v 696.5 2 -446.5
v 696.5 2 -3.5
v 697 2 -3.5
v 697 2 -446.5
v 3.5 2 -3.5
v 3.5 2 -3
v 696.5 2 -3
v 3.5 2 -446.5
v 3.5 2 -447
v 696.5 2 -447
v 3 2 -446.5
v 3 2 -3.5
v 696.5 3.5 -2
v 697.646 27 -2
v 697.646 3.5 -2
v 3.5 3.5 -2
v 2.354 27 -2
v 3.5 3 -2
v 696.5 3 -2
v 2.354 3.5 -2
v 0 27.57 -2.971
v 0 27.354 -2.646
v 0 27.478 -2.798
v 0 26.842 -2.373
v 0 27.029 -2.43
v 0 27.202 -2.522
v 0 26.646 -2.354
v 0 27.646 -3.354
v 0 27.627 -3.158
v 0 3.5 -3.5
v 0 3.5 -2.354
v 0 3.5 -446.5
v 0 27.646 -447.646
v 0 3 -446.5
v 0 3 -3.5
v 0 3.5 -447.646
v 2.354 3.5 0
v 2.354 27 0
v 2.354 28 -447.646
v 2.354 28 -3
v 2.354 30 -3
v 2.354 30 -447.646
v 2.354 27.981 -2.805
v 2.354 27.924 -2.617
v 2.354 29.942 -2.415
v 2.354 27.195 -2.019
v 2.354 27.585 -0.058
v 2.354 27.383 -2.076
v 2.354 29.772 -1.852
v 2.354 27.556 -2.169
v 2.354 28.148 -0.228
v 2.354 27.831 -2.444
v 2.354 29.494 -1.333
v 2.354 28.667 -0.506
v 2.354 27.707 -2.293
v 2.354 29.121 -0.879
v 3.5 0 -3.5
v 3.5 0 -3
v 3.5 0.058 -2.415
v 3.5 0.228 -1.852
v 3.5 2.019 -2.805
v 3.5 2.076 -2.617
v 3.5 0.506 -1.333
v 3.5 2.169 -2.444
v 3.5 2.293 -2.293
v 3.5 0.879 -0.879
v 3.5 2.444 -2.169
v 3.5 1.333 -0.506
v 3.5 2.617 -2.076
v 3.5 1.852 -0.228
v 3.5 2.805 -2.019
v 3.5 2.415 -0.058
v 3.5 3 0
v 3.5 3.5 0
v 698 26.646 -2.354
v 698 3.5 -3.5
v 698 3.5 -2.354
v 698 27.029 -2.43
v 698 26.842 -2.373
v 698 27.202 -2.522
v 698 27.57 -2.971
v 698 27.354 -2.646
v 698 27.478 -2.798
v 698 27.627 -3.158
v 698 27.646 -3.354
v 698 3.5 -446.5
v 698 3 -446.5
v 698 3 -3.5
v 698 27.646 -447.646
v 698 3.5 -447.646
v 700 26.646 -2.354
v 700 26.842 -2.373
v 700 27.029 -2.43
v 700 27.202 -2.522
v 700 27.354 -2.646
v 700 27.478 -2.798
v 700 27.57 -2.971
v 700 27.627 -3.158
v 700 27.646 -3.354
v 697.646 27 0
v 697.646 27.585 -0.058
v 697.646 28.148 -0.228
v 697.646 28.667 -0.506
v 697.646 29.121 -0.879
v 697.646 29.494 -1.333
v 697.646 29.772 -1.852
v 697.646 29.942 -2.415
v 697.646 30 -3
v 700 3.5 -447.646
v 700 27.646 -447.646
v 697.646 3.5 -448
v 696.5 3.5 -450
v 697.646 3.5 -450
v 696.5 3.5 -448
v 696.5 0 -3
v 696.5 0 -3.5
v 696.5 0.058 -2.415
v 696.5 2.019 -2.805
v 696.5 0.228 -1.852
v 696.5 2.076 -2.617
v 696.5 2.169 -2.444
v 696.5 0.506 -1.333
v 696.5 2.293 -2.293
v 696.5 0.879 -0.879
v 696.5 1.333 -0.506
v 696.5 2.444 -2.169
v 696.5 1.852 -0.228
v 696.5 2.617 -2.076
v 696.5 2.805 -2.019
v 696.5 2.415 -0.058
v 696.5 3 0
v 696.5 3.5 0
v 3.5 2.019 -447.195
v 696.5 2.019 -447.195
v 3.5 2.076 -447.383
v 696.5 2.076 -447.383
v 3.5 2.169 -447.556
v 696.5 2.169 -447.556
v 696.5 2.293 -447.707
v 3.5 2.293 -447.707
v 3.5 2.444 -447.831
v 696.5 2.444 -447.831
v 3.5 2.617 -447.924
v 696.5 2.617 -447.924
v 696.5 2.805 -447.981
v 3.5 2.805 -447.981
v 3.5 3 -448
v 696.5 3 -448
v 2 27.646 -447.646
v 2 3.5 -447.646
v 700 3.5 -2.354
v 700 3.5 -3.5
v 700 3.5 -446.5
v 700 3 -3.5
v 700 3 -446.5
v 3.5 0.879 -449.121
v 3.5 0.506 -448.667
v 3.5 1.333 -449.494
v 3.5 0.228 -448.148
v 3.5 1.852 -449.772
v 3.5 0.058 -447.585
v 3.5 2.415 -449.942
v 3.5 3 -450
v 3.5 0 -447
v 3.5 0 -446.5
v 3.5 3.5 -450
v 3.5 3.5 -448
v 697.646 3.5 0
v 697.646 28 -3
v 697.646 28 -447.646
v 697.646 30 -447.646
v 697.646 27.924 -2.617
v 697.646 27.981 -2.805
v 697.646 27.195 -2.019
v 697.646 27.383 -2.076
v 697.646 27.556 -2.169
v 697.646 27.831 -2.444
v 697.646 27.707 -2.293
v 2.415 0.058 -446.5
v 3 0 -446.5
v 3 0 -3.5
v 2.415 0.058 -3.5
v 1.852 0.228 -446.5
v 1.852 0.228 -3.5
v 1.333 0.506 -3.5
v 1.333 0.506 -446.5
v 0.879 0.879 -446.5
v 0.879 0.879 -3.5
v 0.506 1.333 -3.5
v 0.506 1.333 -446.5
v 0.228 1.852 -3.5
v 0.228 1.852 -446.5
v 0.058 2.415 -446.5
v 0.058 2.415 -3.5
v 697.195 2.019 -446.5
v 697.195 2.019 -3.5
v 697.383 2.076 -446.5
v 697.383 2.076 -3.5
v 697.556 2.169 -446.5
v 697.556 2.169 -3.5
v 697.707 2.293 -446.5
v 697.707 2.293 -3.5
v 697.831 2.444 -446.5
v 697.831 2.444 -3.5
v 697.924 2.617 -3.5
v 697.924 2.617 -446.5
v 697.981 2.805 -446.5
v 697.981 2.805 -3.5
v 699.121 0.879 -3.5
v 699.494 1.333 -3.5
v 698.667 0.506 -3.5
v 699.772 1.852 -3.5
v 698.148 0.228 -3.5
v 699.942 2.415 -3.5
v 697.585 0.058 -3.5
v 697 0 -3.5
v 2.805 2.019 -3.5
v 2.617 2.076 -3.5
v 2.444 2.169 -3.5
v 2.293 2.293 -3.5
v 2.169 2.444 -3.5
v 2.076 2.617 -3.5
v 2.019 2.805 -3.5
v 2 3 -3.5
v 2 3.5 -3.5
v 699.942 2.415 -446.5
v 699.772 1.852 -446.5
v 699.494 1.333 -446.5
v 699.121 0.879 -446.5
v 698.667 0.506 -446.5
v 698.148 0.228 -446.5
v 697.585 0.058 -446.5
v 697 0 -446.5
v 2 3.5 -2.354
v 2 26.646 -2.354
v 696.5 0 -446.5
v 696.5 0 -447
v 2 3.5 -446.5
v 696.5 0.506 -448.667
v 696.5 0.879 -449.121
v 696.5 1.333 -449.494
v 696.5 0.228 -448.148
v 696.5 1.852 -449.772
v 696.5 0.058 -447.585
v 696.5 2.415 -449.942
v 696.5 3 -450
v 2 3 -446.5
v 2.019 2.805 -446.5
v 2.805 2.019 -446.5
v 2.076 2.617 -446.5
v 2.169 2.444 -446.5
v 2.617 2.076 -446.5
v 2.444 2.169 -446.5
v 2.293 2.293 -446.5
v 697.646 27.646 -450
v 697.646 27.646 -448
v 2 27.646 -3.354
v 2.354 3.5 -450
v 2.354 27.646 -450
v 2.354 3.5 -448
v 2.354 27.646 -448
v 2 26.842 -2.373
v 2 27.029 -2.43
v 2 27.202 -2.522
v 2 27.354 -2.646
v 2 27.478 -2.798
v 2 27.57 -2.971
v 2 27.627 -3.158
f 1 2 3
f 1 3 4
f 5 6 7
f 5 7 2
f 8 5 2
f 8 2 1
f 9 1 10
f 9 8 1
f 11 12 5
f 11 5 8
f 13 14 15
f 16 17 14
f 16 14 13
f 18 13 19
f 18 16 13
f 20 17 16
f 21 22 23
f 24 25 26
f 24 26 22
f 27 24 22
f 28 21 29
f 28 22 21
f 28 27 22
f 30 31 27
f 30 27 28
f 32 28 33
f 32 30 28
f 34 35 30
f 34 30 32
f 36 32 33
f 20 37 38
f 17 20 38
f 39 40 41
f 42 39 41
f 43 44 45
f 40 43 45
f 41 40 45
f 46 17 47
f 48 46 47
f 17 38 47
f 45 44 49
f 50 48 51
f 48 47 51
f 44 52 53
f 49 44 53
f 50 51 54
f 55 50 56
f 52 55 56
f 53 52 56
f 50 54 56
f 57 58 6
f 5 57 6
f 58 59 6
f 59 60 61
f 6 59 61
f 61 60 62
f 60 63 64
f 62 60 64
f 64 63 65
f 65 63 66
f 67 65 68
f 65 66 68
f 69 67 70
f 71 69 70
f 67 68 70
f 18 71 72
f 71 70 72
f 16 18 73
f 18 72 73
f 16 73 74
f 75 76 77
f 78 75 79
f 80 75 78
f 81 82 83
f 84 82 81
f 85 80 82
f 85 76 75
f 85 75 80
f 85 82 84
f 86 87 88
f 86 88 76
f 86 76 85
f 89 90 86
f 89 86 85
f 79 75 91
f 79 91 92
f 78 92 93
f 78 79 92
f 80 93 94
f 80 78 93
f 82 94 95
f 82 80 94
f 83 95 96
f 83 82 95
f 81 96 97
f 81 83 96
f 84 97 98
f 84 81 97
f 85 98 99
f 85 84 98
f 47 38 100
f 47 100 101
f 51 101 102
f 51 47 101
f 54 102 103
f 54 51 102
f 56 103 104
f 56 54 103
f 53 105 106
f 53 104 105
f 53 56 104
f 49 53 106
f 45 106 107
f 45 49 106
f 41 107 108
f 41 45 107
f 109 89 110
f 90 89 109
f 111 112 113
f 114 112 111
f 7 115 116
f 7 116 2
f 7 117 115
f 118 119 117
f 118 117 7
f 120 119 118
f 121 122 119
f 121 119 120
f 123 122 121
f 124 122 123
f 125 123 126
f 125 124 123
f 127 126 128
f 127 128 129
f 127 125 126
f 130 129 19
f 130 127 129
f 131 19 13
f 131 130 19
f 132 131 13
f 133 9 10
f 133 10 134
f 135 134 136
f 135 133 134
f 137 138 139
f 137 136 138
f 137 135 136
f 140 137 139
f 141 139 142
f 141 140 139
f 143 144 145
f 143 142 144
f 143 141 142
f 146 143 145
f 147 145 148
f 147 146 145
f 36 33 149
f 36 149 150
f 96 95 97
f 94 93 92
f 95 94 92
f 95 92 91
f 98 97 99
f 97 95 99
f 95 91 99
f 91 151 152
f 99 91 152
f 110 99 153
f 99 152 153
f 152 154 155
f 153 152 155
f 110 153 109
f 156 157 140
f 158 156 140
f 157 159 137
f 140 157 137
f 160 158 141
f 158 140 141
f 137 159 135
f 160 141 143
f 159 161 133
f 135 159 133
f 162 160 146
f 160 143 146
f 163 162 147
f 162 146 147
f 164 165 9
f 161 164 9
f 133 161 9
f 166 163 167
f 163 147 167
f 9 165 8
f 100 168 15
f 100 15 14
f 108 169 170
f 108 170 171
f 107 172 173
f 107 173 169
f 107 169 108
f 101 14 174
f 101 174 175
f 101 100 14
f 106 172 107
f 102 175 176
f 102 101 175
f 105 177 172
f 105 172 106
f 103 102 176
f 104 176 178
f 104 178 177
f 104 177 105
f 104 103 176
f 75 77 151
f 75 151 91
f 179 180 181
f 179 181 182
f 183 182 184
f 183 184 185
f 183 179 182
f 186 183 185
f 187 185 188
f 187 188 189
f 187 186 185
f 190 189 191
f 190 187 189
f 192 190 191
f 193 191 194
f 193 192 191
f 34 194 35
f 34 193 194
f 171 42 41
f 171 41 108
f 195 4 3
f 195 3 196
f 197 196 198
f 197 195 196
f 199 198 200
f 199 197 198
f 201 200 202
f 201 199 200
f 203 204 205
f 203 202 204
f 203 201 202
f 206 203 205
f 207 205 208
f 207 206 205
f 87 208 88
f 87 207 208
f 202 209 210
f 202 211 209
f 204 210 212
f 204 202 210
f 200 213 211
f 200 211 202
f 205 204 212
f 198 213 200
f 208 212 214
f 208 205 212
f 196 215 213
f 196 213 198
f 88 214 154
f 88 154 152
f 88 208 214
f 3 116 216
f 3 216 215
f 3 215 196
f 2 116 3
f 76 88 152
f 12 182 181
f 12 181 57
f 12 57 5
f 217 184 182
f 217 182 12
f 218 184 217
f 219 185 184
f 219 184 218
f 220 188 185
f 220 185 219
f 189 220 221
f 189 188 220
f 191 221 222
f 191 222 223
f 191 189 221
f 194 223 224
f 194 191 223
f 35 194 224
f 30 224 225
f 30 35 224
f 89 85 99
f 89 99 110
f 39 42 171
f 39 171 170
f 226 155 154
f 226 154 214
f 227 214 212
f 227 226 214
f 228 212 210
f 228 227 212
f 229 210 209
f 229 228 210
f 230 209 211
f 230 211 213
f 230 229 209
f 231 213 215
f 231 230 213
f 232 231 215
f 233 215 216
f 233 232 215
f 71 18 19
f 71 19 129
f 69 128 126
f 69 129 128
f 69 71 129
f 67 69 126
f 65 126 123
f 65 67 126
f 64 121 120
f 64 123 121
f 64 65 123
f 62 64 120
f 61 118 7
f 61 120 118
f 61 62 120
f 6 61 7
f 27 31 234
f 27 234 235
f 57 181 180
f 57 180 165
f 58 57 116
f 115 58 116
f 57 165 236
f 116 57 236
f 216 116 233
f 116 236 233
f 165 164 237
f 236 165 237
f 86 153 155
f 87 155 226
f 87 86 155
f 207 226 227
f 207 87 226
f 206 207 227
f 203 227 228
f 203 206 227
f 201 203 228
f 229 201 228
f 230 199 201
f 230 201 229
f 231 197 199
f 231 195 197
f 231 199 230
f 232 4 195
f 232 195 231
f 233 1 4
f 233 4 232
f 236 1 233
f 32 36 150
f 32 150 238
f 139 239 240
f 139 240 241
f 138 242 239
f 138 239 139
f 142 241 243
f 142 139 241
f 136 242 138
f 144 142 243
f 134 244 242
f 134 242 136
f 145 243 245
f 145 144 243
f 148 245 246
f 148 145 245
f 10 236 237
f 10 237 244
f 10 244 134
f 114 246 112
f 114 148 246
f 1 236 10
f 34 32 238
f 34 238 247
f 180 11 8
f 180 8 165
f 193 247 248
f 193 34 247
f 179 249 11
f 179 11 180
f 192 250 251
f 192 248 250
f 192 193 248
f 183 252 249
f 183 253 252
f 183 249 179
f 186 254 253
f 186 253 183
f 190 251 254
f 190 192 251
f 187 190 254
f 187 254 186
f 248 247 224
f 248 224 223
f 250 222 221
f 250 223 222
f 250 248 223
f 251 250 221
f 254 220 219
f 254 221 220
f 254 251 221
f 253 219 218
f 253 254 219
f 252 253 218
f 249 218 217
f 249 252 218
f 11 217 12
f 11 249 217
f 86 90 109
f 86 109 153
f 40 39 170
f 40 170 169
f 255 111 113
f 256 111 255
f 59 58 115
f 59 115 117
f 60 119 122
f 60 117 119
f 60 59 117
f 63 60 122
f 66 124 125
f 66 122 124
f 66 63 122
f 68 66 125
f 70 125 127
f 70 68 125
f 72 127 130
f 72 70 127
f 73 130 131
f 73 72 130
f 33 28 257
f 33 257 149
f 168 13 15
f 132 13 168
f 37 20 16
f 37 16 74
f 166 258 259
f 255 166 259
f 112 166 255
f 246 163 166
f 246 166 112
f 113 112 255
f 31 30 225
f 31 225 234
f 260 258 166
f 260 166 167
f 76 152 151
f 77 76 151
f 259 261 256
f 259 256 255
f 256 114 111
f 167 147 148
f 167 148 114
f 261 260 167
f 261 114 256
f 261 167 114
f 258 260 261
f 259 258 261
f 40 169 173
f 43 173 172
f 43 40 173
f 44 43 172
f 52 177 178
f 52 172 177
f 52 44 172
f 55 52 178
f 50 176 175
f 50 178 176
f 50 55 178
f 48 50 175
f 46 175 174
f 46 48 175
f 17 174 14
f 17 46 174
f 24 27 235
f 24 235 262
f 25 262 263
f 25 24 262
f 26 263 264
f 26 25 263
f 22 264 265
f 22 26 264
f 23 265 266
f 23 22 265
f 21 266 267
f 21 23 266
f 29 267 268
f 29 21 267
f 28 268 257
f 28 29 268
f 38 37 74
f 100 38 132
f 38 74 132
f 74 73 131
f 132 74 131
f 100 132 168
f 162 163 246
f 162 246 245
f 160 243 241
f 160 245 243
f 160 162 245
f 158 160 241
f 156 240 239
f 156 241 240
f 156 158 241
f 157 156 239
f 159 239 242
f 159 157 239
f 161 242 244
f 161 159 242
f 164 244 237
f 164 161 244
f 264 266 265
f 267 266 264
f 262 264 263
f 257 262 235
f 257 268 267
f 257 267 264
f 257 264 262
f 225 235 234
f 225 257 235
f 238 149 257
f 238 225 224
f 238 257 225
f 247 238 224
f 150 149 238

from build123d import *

# Parameters (mm, degrees)
SKETCH2_W                  = 700
SKETCH2_H                  = 450
BOSS_EXTRUDE1_DEPTH        = 30
CONVERT_SOLID1_START       = 3
CONVERT_SOLID1_DEPTH       = 694
CONVERT_SOLID1_2_OUTLINE_W = 24.146446609
CONVERT_SOLID1_2_OUTLINE_H = 2
CONVERT_SOLID1_2_DEPTH     = 2.353553391
CONVERT_SOLID1_START_2     = 697.646446609
CONVERT_SOLID1_3_OUTLINE_W = 24.146446609
CONVERT_SOLID1_3_OUTLINE_H = 2
CONVERT_SOLID1_3_DEPTH     = 2.353553391
CONVERT_SOLID1_4_DEPTH     = 700
CONVERT_SOLID1_5_DEPTH     = 2.353553391
CONVERT_SOLID1_6_DEPTH     = 2.353553391
CONVERT_SOLID1_START_3     = 2.353553391
CONVERT_SOLID1_7_DEPTH     = 1.146446609
CONVERT_SOLID1_START_4     = 696.5
CONVERT_SOLID1_8_DEPTH     = 1.146446609
CONVERT_SOLID1_START_5     = -447.646446609
CONVERT_SOLID1_9_DEPTH     = 445.292893218


with BuildPart() as part:
    # Sketch2 → Boss-Extrude1 (new body)
    with BuildSketch(Plane(origin=(0, 0, 0), x_dir=(1, 0, 0), z_dir=(0, 1, 0))):
        with Locations((350, 225)):
            Rectangle(SKETCH2_W, SKETCH2_H)
    extrude(amount=BOSS_EXTRUDE1_DEPTH)

    # Convert-Solid1: read off the stored shape, not the designer's step
    # Convert-Solid1 outline → Convert-Solid1 (cut)
    with BuildSketch(Plane.YZ.offset(CONVERT_SOLID1_START)):
        with BuildLine():
            Line((3.5, -3.5), (2, -3.5))
            Line((2, -3.5), (2, -446.5))
            Line((2, -446.5), (3.5, -446.5))
            Line((3.5, -446.5), (3.5, -447.646446609))
            Line((3.5, -447.646446609), (27.646446609, -447.646446609))
            Line((27.646446609, -447.646446609), (27.646446609, -3.353553391))
            ThreePointArc((27.646446609, -3.353553391), (27.353553391, -2.646446609), (26.646446609, -2.353553391))
            Line((26.646446609, -2.353553391), (3.5, -2.353553391))
            Line((3.5, -2.353553391), (3.5, -3.5))
        make_face()
    extrude(amount=CONVERT_SOLID1_DEPTH, mode=Mode.SUBTRACT)

    # Convert-Solid1 2 outline → Convert-Solid1 2 (cut)
    with BuildSketch(Plane.YZ):
        with Locations((15.573223305, -449)):
            Rectangle(CONVERT_SOLID1_2_OUTLINE_W, CONVERT_SOLID1_2_OUTLINE_H)
    extrude(amount=CONVERT_SOLID1_2_DEPTH, mode=Mode.SUBTRACT)

    # Convert-Solid1 3 outline → Convert-Solid1 3 (cut)
    with BuildSketch(Plane.YZ.offset(CONVERT_SOLID1_START_2)):
        with Locations((15.573223305, -449)):
            Rectangle(CONVERT_SOLID1_3_OUTLINE_W, CONVERT_SOLID1_3_OUTLINE_H)
    extrude(amount=CONVERT_SOLID1_3_DEPTH, mode=Mode.SUBTRACT)

    # Convert-Solid1 4 outline → Convert-Solid1 4 (cut)
    with BuildSketch(Plane.YZ):
        with BuildLine():
            Line((2, -3), (2, -3.5))
            Line((2, -3.5), (3.5, -3.5))
            Line((3.5, -3.5), (3.5, -2.353553391))
            Line((3.5, -2.353553391), (26.646446609, -2.353553391))
            ThreePointArc((26.646446609, -2.353553391), (27.353553391, -2.646446609), (27.646446609, -3.353553391))
            Line((27.646446609, -3.353553391), (27.646446609, -447.646446609))
            Line((27.646446609, -447.646446609), (3.5, -447.646446609))
            Line((3.5, -447.646446609), (3.5, -446.5))
            Line((3.5, -446.5), (2, -446.5))
            Line((2, -446.5), (2, -447))
            ThreePointArc((2, -447), (2.292893219, -447.707106781), (3, -448))
            Line((3, -448), (27.646446609, -448))
            Line((27.646446609, -448), (27.646446609, -450))
            Line((27.646446609, -450), (30, -450))
            Line((30, -450), (30, -447.646446609))
            Line((30, -447.646446609), (28, -447.646446609))
            Line((28, -447.646446609), (28, -3))
            ThreePointArc((28, -3), (27.707106781, -2.292893219), (27, -2))
            Line((27, -2), (3, -2))
            ThreePointArc((3, -2), (2.292893219, -2.292893219), (2, -3))
        make_face()
        with BuildLine():
            Line((0, 0), (0, -3))
            ThreePointArc((0, -3), (0.878679656, -0.878679656), (3, 0))
            Line((3, 0), (0, 0))
        make_face()
        with BuildLine():
            ThreePointArc((3, -450), (0.878679656, -449.121320344), (0, -447))
            Line((0, -447), (0, -450))
            Line((0, -450), (3, -450))
        make_face()
        with BuildLine():
            Line((30, 0), (27, 0))
            ThreePointArc((27, 0), (29.121320344, -0.878679656), (30, -3))
            Line((30, -3), (30, 0))
        make_face()
    extrude(amount=CONVERT_SOLID1_4_DEPTH, mode=Mode.SUBTRACT)

    # Convert-Solid1 5 outline → Convert-Solid1 5 (cut)
    with BuildSketch(Plane.YZ):
        with BuildLine():
            Line((0, -3), (0, -3.5))
            Line((0, -3.5), (2, -3.5))
            Line((2, -3.5), (2, -3))
            ThreePointArc((2, -3), (2.292893219, -2.292893219), (3, -2))
            Line((3, -2), (27, -2))
            ThreePointArc((27, -2), (27.707106781, -2.292893219), (28, -3))
            Line((28, -3), (28, -447.646446609))
            Line((28, -447.646446609), (30, -447.646446609))
            Line((30, -447.646446609), (30, -3))
            ThreePointArc((30, -3), (29.121320344, -0.878679656), (27, 0))
            Line((27, 0), (3, 0))
            ThreePointArc((3, 0), (0.878679656, -0.878679656), (0, -3))
        make_face()
        with BuildLine():
            Line((2, -446.5), (0, -446.5))
            Line((0, -446.5), (0, -447))
            ThreePointArc((0, -447), (0.878679656, -449.121320344), (3, -450))
            Line((3, -450), (3.5, -450))
            Line((3.5, -450), (3.5, -448))
            Line((3.5, -448), (3, -448))
            ThreePointArc((3, -448), (2.292893219, -447.707106781), (2, -447))
            Line((2, -447), (2, -446.5))
        make_face()
    extrude(amount=CONVERT_SOLID1_5_DEPTH, mode=Mode.SUBTRACT)

    # Convert-Solid1 6 outline → Convert-Solid1 6 (cut)
    with BuildSketch(Plane.YZ.offset(CONVERT_SOLID1_START_2)):
        with BuildLine():
            Line((0, -3), (0, -3.5))
            Line((0, -3.5), (2, -3.5))
            Line((2, -3.5), (2, -3))
            ThreePointArc((2, -3), (2.292893219, -2.292893219), (3, -2))
            Line((3, -2), (27, -2))
            ThreePointArc((27, -2), (27.707106781, -2.292893219), (28, -3))
            Line((28, -3), (28, -447.646446609))
            Line((28, -447.646446609), (30, -447.646446609))
            Line((30, -447.646446609), (30, -3))
            ThreePointArc((30, -3), (29.121320344, -0.878679656), (27, 0))
            Line((27, 0), (3, 0))
            ThreePointArc((3, 0), (0.878679656, -0.878679656), (0, -3))
        make_face()
        with BuildLine():
            Line((2, -446.5), (0, -446.5))
            Line((0, -446.5), (0, -447))
            ThreePointArc((0, -447), (0.878679656, -449.121320344), (3, -450))
            Line((3, -450), (3.5, -450))
            Line((3.5, -450), (3.5, -448))
            Line((3.5, -448), (3, -448))
            ThreePointArc((3, -448), (2.292893219, -447.707106781), (2, -447))
            Line((2, -447), (2, -446.5))
        make_face()
    extrude(amount=CONVERT_SOLID1_6_DEPTH, mode=Mode.SUBTRACT)

    # Convert-Solid1 7 outline → Convert-Solid1 7 (cut)
    with BuildSketch(Plane.YZ.offset(CONVERT_SOLID1_START_3)):
        with BuildLine():
            Line((0, -3), (0, -3.5))
            Line((0, -3.5), (2, -3.5))
            Line((2, -3.5), (2, -3))
            ThreePointArc((2, -3), (2.292893219, -2.292893219), (3, -2))
            Line((3, -2), (3.5, -2))
            Line((3.5, -2), (3.5, 0))
            Line((3.5, 0), (3, 0))
            ThreePointArc((3, 0), (0.878679656, -0.878679656), (0, -3))
        make_face()
        with BuildLine():
            Line((2, -446.5), (0, -446.5))
            Line((0, -446.5), (0, -447))
            ThreePointArc((0, -447), (0.878679656, -449.121320344), (3, -450))
            Line((3, -450), (3.5, -450))
            Line((3.5, -450), (3.5, -448))
            Line((3.5, -448), (3, -448))
            ThreePointArc((3, -448), (2.292893219, -447.707106781), (2, -447))
            Line((2, -447), (2, -446.5))
        make_face()
    extrude(amount=CONVERT_SOLID1_7_DEPTH, mode=Mode.SUBTRACT)

    # Convert-Solid1 8 outline → Convert-Solid1 8 (cut)
    with BuildSketch(Plane.YZ.offset(CONVERT_SOLID1_START_4)):
        with BuildLine():
            Line((0, -3), (0, -3.5))
            Line((0, -3.5), (2, -3.5))
            Line((2, -3.5), (2, -3))
            ThreePointArc((2, -3), (2.292893219, -2.292893219), (3, -2))
            Line((3, -2), (3.5, -2))
            Line((3.5, -2), (3.5, 0))
            Line((3.5, 0), (3, 0))
            ThreePointArc((3, 0), (0.878679656, -0.878679656), (0, -3))
        make_face()
        with BuildLine():
            Line((2, -446.5), (0, -446.5))
            Line((0, -446.5), (0, -447))
            ThreePointArc((0, -447), (0.878679656, -449.121320344), (3, -450))
            Line((3, -450), (3.5, -450))
            Line((3.5, -450), (3.5, -448))
            Line((3.5, -448), (3, -448))
            ThreePointArc((3, -448), (2.292893219, -447.707106781), (2, -447))
            Line((2, -447), (2, -446.5))
        make_face()
    extrude(amount=CONVERT_SOLID1_8_DEPTH, mode=Mode.SUBTRACT)

    # Convert-Solid1 9 outline → Convert-Solid1 9 (cut)
    with BuildSketch(Plane.XY.offset(CONVERT_SOLID1_START_5)):
        with BuildLine():
            Line((0, 0), (3, 0))
            ThreePointArc((3, 0), (0.878679656, 0.878679656), (0, 3))
            Line((0, 3), (0, 0))
        make_face()
        with BuildLine():
            ThreePointArc((700, 3), (699.121320344, 0.878679656), (697, 0))
            Line((697, 0), (700, 0))
            Line((700, 0), (700, 3))
        make_face()
        with BuildLine():
            Line((697, 27.646446609), (697, 2))
            ThreePointArc((697, 2), (697.707106781, 2.292893219), (698, 3))
            Line((698, 3), (698, 27.646446609))
            Line((698, 27.646446609), (697, 27.646446609))
        make_face()
        with BuildLine():
            Line((3, 2), (3, 27.646446609))
            Line((3, 27.646446609), (2, 27.646446609))
            Line((2, 27.646446609), (2, 3))
            ThreePointArc((2, 3), (2.292893219, 2.292893219), (3, 2))
        make_face()
    extrude(amount=CONVERT_SOLID1_9_DEPTH, mode=Mode.SUBTRACT)


solid = part.part
